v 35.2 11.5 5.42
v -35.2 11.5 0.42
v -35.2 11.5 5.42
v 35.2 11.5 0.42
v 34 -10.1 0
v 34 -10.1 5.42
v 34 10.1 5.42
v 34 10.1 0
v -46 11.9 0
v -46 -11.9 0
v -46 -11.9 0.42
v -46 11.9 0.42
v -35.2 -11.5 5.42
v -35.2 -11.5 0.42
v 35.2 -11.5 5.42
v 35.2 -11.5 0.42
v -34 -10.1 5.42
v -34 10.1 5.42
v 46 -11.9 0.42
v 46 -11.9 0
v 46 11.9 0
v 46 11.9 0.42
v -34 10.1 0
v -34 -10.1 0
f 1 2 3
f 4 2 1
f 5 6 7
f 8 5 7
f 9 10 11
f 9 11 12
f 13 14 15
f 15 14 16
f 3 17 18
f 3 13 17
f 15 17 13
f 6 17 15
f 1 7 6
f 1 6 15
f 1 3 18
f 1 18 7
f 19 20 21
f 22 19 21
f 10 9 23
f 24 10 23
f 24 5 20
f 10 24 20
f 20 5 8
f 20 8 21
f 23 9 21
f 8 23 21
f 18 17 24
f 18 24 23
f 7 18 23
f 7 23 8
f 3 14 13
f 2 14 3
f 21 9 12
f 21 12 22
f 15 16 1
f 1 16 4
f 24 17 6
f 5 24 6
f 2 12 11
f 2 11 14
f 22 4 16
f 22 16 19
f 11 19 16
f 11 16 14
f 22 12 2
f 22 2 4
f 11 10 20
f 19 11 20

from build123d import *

# Parameters (mm, degrees)
F0_W     = 92
F0_H     = 23.8
F1_DEPTH = 0.42
F2_W     = 70.4
F2_H     = 23
F2_W_2   = 68
F2_H_2   = 20.2
F3_DEPTH = 5
F4_W     = 68
F4_H     = 20.2
F5_DEPTH = 25


with BuildPart() as f1:
    # F0 (on Top) → F1 (new body)
    with BuildSketch(Plane.XY):
        Rectangle(F0_W, F0_H)
    extrude(amount=F1_DEPTH)

    # F2 (on face) → F3 (join)
    with BuildSketch(Plane.XY.offset(0.42)):
        Rectangle(F2_W, F2_H)
        Rectangle(F2_W_2, F2_H_2, mode=Mode.SUBTRACT)
    extrude(amount=F3_DEPTH)

    # F4 (on face) → F5 (cut)
    with BuildSketch(Plane.XY.offset(0.42)):
        Rectangle(F4_W, F4_H)
    extrude(amount=-F5_DEPTH, mode=Mode.SUBTRACT)


solid = f1.part
